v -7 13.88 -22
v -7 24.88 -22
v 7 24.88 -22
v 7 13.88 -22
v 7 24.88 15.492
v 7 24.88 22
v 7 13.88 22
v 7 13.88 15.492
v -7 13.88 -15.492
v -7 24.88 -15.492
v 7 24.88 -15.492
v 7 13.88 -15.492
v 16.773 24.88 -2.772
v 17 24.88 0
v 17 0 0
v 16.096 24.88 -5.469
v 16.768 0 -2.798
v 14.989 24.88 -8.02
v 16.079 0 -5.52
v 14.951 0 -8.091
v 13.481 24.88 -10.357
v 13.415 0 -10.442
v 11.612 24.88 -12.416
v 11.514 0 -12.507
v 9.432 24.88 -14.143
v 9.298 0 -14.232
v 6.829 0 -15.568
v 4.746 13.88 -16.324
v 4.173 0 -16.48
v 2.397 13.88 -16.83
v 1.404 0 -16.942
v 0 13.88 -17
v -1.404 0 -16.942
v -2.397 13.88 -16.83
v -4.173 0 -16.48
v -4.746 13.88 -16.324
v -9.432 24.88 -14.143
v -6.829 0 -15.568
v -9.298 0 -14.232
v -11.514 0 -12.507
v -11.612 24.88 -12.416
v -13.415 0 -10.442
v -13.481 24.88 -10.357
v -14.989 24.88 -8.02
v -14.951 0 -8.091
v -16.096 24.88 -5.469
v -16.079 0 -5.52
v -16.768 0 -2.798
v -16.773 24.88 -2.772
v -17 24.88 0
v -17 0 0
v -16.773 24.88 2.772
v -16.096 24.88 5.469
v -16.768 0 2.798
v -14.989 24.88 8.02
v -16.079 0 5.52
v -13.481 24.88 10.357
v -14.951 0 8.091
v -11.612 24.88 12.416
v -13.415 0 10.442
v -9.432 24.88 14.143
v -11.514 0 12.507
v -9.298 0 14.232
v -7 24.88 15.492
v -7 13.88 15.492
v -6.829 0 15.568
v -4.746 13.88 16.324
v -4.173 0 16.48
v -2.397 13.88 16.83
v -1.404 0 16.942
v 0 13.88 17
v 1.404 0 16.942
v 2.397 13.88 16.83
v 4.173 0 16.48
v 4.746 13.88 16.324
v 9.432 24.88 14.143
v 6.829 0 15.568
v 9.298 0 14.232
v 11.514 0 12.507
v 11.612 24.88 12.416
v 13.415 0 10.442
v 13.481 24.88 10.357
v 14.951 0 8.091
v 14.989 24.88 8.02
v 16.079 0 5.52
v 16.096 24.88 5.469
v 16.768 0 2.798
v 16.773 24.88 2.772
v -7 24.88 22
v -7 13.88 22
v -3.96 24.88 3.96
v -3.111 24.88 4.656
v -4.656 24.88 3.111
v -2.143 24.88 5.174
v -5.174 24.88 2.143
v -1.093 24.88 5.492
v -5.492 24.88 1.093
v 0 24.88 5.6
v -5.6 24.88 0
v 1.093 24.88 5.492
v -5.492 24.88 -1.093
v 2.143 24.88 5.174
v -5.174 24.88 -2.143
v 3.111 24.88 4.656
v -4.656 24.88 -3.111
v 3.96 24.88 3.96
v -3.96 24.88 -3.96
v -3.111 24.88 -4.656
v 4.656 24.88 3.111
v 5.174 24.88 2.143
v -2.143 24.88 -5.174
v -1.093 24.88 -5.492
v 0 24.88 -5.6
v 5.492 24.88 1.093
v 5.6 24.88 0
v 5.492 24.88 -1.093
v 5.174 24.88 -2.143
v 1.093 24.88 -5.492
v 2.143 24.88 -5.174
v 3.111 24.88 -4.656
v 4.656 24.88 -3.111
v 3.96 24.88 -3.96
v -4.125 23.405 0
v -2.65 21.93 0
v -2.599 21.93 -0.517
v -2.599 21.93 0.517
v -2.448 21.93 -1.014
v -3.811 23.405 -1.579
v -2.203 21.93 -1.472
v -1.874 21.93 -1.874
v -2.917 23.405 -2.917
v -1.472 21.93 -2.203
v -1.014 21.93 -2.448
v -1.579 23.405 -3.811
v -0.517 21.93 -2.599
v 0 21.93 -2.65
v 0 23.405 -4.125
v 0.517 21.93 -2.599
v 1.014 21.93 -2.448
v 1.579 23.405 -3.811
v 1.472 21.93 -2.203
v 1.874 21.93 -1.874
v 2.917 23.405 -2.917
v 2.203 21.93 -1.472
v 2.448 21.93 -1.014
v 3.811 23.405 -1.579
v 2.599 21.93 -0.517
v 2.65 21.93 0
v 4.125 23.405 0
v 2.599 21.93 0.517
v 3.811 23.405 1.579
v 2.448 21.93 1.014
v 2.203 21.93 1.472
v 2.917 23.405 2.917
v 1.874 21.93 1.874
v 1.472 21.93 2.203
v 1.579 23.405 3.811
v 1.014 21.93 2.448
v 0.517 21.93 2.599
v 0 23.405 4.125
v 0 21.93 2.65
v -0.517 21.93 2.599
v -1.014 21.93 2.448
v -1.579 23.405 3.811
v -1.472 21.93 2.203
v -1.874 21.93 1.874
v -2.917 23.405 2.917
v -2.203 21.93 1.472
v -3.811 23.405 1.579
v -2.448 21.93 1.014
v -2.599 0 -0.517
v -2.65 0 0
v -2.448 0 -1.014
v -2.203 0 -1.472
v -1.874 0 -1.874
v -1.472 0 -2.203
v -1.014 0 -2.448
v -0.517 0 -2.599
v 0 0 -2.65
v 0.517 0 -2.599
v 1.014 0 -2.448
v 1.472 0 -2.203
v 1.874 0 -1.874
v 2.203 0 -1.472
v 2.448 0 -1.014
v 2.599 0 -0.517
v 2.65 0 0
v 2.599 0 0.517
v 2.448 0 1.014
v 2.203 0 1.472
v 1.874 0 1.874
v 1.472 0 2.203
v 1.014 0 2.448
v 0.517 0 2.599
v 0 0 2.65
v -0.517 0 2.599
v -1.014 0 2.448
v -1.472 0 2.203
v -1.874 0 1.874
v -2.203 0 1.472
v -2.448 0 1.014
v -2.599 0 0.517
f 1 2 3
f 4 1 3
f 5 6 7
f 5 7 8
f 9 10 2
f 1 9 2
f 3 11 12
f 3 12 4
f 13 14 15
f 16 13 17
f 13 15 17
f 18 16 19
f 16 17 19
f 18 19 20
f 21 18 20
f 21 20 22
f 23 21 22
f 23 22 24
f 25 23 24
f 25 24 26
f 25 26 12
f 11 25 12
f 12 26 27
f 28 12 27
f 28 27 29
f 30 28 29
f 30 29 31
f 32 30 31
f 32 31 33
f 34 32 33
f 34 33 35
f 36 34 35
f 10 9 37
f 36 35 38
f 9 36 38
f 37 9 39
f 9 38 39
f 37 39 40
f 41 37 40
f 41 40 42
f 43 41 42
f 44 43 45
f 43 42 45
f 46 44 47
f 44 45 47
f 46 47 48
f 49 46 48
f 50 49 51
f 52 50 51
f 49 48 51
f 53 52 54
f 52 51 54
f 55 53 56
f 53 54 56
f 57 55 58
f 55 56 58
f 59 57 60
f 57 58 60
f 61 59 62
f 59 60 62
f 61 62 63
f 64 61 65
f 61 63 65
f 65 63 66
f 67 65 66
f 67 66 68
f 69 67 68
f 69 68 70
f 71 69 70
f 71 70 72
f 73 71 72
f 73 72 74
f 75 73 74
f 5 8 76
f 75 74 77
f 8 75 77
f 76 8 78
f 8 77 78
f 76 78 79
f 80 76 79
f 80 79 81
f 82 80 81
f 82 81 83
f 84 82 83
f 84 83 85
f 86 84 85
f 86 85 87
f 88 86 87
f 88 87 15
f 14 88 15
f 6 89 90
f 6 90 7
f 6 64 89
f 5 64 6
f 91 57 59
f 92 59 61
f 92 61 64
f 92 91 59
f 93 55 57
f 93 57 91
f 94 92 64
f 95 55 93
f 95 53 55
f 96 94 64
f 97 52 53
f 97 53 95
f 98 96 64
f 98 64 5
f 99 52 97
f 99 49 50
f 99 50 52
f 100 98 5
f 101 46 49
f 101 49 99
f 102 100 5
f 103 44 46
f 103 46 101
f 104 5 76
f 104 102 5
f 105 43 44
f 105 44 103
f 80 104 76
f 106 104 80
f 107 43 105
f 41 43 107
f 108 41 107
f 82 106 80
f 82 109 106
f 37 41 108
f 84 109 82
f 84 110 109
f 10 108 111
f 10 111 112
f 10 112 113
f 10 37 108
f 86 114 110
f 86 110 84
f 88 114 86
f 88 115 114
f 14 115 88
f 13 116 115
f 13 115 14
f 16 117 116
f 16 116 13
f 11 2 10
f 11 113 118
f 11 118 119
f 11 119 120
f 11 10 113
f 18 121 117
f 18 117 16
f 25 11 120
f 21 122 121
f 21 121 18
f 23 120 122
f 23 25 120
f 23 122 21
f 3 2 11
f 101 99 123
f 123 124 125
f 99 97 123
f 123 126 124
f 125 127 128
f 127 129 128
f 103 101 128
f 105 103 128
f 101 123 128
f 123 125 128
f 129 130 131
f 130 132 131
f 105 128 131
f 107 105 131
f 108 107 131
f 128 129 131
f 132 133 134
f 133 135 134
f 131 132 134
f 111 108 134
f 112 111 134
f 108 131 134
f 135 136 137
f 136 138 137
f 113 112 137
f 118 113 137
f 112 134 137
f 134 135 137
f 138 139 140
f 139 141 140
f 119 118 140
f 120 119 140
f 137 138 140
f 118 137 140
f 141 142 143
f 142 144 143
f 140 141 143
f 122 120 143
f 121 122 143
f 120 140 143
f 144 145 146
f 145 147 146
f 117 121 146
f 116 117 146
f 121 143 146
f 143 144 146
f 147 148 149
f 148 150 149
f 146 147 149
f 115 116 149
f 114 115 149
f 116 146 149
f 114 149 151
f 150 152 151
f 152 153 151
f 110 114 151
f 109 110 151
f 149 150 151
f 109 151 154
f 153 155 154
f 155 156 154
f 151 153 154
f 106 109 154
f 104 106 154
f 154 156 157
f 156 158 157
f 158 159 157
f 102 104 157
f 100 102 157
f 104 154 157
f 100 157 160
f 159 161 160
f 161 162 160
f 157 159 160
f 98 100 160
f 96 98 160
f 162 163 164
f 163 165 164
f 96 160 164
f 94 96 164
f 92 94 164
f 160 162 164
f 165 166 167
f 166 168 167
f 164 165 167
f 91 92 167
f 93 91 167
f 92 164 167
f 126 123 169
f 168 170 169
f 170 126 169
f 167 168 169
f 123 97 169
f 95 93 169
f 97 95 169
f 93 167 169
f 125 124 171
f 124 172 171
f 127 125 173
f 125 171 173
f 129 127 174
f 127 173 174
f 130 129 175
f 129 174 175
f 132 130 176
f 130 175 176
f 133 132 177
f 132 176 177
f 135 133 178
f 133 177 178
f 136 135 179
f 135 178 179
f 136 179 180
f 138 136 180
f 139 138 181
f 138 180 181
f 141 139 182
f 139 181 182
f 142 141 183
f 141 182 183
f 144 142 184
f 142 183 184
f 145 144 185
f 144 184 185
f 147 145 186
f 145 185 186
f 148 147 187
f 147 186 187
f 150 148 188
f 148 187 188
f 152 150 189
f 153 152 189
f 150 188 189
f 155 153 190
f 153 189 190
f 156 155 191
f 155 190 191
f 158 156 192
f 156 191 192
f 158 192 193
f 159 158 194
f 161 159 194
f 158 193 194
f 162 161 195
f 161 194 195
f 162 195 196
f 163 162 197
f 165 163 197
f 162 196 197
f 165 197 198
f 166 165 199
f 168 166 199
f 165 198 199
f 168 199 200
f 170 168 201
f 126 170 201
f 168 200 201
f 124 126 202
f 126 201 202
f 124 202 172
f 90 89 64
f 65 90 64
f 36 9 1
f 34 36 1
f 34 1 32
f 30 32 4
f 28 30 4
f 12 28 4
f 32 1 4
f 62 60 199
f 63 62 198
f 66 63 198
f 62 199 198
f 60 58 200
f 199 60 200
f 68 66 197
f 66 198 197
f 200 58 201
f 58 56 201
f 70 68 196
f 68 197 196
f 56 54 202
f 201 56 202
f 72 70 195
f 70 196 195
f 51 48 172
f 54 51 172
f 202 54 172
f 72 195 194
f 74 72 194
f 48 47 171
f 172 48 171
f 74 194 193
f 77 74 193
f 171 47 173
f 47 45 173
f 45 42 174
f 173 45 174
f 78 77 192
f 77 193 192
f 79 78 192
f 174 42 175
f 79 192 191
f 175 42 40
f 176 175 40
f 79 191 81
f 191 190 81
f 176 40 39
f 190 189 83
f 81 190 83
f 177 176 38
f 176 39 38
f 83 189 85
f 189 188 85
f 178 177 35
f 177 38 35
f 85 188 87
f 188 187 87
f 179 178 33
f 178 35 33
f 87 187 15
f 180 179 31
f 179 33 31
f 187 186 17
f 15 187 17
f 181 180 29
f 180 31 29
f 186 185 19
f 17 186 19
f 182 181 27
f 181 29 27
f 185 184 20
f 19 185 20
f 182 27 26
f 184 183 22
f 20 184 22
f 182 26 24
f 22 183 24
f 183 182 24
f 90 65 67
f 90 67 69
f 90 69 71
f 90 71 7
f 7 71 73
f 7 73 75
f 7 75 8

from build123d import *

# Parameters (mm, degrees)
SKETCH1_R                     = 17
BOSS_EXTRUDE1_DEPTH           = 24.88
SKETCH2_W                     = 14
SKETCH2_H                     = 44
BOSS_EXTRUDE2_DEPTH           = 11
CSK_FOR_M5_SFHCS1_D           = 5.3
CSK_FOR_M5_SFHCS1_CSINK_D     = 11.2
CSK_FOR_M5_SFHCS1_CSINK_ANGLE = 90


with BuildPart() as part:
    # Sketch1 → Boss-Extrude1 (new body)
    with BuildSketch(Plane(origin=(0, 0, 0), x_dir=(1, 0, 0), z_dir=(0, 1, 0))):
        Circle(SKETCH1_R)
    extrude(amount=BOSS_EXTRUDE1_DEPTH)

    # Sketch2 → Boss-Extrude2 (add)
    with BuildSketch(Plane(origin=(0, 24.88, 0), x_dir=(1, 0, 0), z_dir=(0, 1, 0))):
        Rectangle(SKETCH2_W, SKETCH2_H)
    extrude(amount=-BOSS_EXTRUDE2_DEPTH)

    # CSK for M5 SFHCS1 (through all)
    with Locations(Plane(origin=(0, 24.88, 0), x_dir=(1, 0, 0), z_dir=(0, 1, 0))):
        with Locations((0, 0)):
            CounterSinkHole(CSK_FOR_M5_SFHCS1_D / 2, CSK_FOR_M5_SFHCS1_CSINK_D / 2, counter_sink_angle=CSK_FOR_M5_SFHCS1_CSINK_ANGLE)


solid = part.part
